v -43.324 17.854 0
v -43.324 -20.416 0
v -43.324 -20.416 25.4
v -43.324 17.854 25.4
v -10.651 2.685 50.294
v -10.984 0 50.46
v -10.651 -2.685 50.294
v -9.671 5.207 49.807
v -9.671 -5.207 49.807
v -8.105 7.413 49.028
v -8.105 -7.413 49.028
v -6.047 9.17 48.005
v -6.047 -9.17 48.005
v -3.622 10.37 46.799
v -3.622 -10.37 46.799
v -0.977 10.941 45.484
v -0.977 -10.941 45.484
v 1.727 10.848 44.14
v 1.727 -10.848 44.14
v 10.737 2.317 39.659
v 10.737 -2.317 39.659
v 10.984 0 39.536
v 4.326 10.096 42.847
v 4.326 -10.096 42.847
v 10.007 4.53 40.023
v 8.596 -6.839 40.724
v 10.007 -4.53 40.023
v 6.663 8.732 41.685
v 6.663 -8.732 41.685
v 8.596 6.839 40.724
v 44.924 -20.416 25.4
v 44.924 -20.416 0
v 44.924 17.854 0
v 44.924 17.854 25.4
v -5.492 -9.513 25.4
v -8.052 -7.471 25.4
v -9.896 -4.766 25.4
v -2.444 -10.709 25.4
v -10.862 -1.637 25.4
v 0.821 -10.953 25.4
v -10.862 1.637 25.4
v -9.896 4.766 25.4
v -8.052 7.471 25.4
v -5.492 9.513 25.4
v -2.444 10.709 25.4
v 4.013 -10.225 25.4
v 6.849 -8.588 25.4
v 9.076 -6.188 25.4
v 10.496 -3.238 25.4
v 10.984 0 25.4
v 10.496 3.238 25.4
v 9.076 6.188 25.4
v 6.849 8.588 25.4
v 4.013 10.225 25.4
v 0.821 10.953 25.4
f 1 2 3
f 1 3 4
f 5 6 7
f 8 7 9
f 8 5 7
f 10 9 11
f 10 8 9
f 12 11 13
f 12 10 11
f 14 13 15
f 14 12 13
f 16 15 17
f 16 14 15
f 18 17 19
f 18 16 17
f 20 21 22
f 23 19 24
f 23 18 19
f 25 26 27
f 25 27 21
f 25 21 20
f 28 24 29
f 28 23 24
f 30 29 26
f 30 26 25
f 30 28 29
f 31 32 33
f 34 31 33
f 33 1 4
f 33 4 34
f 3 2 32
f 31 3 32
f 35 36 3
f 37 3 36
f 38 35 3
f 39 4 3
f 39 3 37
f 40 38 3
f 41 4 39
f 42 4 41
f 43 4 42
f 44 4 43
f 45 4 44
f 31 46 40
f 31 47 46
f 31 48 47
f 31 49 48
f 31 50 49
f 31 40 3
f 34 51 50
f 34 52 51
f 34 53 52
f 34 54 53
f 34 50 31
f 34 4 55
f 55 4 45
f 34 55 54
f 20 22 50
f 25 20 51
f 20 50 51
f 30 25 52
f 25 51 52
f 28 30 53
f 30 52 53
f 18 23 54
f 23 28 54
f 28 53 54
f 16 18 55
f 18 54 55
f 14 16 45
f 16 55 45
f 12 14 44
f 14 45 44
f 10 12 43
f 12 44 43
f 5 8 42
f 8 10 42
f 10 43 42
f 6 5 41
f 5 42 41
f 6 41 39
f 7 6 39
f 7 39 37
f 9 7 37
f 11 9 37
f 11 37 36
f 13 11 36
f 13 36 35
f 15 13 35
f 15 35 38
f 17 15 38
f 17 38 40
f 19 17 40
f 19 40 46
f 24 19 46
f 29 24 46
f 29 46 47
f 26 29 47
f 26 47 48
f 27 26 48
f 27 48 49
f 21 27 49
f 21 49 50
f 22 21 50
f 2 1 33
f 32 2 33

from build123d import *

# Parameters (mm, degrees)
F0_W     = 88.247977
F0_H     = 38.269773
F1_DEPTH = 25.4
F2_R     = 10.984207
F3_DEPTH = 25.4
F5_DEPTH = 25.4
F6_DEPTH = 25.4


with BuildPart() as f1:
    # F0 (on Top) → F1 (new body)
    with BuildSketch(Plane.XY):
        with Locations((0.800162, -1.280717)):
            Rectangle(F0_W, F0_H)
    extrude(amount=F1_DEPTH)

    # F2 (on face) → F3 (join)
    with BuildSketch(Plane.XY.offset(25.4)):
        Circle(F2_R)
    extrude(amount=F3_DEPTH)

    # F4 (on Front) → F5 (cut)
    with BuildSketch(Plane.XZ):
        Polygon((19.144135, 55.871744), (-14.150013, 55.871744), (-18.519871, 54.207034), (19.144135, 35.479076), align=None)
    extrude(amount=-F5_DEPTH, mode=Mode.SUBTRACT)

    # F4 (on Front) → F6 (cut)
    with BuildSketch(Plane.XZ):
        Polygon((19.144135, 55.871744), (-14.150013, 55.871744), (-18.519871, 54.207034), (19.144135, 35.479076), align=None)
    extrude(amount=F6_DEPTH, mode=Mode.SUBTRACT)


solid = f1.part
